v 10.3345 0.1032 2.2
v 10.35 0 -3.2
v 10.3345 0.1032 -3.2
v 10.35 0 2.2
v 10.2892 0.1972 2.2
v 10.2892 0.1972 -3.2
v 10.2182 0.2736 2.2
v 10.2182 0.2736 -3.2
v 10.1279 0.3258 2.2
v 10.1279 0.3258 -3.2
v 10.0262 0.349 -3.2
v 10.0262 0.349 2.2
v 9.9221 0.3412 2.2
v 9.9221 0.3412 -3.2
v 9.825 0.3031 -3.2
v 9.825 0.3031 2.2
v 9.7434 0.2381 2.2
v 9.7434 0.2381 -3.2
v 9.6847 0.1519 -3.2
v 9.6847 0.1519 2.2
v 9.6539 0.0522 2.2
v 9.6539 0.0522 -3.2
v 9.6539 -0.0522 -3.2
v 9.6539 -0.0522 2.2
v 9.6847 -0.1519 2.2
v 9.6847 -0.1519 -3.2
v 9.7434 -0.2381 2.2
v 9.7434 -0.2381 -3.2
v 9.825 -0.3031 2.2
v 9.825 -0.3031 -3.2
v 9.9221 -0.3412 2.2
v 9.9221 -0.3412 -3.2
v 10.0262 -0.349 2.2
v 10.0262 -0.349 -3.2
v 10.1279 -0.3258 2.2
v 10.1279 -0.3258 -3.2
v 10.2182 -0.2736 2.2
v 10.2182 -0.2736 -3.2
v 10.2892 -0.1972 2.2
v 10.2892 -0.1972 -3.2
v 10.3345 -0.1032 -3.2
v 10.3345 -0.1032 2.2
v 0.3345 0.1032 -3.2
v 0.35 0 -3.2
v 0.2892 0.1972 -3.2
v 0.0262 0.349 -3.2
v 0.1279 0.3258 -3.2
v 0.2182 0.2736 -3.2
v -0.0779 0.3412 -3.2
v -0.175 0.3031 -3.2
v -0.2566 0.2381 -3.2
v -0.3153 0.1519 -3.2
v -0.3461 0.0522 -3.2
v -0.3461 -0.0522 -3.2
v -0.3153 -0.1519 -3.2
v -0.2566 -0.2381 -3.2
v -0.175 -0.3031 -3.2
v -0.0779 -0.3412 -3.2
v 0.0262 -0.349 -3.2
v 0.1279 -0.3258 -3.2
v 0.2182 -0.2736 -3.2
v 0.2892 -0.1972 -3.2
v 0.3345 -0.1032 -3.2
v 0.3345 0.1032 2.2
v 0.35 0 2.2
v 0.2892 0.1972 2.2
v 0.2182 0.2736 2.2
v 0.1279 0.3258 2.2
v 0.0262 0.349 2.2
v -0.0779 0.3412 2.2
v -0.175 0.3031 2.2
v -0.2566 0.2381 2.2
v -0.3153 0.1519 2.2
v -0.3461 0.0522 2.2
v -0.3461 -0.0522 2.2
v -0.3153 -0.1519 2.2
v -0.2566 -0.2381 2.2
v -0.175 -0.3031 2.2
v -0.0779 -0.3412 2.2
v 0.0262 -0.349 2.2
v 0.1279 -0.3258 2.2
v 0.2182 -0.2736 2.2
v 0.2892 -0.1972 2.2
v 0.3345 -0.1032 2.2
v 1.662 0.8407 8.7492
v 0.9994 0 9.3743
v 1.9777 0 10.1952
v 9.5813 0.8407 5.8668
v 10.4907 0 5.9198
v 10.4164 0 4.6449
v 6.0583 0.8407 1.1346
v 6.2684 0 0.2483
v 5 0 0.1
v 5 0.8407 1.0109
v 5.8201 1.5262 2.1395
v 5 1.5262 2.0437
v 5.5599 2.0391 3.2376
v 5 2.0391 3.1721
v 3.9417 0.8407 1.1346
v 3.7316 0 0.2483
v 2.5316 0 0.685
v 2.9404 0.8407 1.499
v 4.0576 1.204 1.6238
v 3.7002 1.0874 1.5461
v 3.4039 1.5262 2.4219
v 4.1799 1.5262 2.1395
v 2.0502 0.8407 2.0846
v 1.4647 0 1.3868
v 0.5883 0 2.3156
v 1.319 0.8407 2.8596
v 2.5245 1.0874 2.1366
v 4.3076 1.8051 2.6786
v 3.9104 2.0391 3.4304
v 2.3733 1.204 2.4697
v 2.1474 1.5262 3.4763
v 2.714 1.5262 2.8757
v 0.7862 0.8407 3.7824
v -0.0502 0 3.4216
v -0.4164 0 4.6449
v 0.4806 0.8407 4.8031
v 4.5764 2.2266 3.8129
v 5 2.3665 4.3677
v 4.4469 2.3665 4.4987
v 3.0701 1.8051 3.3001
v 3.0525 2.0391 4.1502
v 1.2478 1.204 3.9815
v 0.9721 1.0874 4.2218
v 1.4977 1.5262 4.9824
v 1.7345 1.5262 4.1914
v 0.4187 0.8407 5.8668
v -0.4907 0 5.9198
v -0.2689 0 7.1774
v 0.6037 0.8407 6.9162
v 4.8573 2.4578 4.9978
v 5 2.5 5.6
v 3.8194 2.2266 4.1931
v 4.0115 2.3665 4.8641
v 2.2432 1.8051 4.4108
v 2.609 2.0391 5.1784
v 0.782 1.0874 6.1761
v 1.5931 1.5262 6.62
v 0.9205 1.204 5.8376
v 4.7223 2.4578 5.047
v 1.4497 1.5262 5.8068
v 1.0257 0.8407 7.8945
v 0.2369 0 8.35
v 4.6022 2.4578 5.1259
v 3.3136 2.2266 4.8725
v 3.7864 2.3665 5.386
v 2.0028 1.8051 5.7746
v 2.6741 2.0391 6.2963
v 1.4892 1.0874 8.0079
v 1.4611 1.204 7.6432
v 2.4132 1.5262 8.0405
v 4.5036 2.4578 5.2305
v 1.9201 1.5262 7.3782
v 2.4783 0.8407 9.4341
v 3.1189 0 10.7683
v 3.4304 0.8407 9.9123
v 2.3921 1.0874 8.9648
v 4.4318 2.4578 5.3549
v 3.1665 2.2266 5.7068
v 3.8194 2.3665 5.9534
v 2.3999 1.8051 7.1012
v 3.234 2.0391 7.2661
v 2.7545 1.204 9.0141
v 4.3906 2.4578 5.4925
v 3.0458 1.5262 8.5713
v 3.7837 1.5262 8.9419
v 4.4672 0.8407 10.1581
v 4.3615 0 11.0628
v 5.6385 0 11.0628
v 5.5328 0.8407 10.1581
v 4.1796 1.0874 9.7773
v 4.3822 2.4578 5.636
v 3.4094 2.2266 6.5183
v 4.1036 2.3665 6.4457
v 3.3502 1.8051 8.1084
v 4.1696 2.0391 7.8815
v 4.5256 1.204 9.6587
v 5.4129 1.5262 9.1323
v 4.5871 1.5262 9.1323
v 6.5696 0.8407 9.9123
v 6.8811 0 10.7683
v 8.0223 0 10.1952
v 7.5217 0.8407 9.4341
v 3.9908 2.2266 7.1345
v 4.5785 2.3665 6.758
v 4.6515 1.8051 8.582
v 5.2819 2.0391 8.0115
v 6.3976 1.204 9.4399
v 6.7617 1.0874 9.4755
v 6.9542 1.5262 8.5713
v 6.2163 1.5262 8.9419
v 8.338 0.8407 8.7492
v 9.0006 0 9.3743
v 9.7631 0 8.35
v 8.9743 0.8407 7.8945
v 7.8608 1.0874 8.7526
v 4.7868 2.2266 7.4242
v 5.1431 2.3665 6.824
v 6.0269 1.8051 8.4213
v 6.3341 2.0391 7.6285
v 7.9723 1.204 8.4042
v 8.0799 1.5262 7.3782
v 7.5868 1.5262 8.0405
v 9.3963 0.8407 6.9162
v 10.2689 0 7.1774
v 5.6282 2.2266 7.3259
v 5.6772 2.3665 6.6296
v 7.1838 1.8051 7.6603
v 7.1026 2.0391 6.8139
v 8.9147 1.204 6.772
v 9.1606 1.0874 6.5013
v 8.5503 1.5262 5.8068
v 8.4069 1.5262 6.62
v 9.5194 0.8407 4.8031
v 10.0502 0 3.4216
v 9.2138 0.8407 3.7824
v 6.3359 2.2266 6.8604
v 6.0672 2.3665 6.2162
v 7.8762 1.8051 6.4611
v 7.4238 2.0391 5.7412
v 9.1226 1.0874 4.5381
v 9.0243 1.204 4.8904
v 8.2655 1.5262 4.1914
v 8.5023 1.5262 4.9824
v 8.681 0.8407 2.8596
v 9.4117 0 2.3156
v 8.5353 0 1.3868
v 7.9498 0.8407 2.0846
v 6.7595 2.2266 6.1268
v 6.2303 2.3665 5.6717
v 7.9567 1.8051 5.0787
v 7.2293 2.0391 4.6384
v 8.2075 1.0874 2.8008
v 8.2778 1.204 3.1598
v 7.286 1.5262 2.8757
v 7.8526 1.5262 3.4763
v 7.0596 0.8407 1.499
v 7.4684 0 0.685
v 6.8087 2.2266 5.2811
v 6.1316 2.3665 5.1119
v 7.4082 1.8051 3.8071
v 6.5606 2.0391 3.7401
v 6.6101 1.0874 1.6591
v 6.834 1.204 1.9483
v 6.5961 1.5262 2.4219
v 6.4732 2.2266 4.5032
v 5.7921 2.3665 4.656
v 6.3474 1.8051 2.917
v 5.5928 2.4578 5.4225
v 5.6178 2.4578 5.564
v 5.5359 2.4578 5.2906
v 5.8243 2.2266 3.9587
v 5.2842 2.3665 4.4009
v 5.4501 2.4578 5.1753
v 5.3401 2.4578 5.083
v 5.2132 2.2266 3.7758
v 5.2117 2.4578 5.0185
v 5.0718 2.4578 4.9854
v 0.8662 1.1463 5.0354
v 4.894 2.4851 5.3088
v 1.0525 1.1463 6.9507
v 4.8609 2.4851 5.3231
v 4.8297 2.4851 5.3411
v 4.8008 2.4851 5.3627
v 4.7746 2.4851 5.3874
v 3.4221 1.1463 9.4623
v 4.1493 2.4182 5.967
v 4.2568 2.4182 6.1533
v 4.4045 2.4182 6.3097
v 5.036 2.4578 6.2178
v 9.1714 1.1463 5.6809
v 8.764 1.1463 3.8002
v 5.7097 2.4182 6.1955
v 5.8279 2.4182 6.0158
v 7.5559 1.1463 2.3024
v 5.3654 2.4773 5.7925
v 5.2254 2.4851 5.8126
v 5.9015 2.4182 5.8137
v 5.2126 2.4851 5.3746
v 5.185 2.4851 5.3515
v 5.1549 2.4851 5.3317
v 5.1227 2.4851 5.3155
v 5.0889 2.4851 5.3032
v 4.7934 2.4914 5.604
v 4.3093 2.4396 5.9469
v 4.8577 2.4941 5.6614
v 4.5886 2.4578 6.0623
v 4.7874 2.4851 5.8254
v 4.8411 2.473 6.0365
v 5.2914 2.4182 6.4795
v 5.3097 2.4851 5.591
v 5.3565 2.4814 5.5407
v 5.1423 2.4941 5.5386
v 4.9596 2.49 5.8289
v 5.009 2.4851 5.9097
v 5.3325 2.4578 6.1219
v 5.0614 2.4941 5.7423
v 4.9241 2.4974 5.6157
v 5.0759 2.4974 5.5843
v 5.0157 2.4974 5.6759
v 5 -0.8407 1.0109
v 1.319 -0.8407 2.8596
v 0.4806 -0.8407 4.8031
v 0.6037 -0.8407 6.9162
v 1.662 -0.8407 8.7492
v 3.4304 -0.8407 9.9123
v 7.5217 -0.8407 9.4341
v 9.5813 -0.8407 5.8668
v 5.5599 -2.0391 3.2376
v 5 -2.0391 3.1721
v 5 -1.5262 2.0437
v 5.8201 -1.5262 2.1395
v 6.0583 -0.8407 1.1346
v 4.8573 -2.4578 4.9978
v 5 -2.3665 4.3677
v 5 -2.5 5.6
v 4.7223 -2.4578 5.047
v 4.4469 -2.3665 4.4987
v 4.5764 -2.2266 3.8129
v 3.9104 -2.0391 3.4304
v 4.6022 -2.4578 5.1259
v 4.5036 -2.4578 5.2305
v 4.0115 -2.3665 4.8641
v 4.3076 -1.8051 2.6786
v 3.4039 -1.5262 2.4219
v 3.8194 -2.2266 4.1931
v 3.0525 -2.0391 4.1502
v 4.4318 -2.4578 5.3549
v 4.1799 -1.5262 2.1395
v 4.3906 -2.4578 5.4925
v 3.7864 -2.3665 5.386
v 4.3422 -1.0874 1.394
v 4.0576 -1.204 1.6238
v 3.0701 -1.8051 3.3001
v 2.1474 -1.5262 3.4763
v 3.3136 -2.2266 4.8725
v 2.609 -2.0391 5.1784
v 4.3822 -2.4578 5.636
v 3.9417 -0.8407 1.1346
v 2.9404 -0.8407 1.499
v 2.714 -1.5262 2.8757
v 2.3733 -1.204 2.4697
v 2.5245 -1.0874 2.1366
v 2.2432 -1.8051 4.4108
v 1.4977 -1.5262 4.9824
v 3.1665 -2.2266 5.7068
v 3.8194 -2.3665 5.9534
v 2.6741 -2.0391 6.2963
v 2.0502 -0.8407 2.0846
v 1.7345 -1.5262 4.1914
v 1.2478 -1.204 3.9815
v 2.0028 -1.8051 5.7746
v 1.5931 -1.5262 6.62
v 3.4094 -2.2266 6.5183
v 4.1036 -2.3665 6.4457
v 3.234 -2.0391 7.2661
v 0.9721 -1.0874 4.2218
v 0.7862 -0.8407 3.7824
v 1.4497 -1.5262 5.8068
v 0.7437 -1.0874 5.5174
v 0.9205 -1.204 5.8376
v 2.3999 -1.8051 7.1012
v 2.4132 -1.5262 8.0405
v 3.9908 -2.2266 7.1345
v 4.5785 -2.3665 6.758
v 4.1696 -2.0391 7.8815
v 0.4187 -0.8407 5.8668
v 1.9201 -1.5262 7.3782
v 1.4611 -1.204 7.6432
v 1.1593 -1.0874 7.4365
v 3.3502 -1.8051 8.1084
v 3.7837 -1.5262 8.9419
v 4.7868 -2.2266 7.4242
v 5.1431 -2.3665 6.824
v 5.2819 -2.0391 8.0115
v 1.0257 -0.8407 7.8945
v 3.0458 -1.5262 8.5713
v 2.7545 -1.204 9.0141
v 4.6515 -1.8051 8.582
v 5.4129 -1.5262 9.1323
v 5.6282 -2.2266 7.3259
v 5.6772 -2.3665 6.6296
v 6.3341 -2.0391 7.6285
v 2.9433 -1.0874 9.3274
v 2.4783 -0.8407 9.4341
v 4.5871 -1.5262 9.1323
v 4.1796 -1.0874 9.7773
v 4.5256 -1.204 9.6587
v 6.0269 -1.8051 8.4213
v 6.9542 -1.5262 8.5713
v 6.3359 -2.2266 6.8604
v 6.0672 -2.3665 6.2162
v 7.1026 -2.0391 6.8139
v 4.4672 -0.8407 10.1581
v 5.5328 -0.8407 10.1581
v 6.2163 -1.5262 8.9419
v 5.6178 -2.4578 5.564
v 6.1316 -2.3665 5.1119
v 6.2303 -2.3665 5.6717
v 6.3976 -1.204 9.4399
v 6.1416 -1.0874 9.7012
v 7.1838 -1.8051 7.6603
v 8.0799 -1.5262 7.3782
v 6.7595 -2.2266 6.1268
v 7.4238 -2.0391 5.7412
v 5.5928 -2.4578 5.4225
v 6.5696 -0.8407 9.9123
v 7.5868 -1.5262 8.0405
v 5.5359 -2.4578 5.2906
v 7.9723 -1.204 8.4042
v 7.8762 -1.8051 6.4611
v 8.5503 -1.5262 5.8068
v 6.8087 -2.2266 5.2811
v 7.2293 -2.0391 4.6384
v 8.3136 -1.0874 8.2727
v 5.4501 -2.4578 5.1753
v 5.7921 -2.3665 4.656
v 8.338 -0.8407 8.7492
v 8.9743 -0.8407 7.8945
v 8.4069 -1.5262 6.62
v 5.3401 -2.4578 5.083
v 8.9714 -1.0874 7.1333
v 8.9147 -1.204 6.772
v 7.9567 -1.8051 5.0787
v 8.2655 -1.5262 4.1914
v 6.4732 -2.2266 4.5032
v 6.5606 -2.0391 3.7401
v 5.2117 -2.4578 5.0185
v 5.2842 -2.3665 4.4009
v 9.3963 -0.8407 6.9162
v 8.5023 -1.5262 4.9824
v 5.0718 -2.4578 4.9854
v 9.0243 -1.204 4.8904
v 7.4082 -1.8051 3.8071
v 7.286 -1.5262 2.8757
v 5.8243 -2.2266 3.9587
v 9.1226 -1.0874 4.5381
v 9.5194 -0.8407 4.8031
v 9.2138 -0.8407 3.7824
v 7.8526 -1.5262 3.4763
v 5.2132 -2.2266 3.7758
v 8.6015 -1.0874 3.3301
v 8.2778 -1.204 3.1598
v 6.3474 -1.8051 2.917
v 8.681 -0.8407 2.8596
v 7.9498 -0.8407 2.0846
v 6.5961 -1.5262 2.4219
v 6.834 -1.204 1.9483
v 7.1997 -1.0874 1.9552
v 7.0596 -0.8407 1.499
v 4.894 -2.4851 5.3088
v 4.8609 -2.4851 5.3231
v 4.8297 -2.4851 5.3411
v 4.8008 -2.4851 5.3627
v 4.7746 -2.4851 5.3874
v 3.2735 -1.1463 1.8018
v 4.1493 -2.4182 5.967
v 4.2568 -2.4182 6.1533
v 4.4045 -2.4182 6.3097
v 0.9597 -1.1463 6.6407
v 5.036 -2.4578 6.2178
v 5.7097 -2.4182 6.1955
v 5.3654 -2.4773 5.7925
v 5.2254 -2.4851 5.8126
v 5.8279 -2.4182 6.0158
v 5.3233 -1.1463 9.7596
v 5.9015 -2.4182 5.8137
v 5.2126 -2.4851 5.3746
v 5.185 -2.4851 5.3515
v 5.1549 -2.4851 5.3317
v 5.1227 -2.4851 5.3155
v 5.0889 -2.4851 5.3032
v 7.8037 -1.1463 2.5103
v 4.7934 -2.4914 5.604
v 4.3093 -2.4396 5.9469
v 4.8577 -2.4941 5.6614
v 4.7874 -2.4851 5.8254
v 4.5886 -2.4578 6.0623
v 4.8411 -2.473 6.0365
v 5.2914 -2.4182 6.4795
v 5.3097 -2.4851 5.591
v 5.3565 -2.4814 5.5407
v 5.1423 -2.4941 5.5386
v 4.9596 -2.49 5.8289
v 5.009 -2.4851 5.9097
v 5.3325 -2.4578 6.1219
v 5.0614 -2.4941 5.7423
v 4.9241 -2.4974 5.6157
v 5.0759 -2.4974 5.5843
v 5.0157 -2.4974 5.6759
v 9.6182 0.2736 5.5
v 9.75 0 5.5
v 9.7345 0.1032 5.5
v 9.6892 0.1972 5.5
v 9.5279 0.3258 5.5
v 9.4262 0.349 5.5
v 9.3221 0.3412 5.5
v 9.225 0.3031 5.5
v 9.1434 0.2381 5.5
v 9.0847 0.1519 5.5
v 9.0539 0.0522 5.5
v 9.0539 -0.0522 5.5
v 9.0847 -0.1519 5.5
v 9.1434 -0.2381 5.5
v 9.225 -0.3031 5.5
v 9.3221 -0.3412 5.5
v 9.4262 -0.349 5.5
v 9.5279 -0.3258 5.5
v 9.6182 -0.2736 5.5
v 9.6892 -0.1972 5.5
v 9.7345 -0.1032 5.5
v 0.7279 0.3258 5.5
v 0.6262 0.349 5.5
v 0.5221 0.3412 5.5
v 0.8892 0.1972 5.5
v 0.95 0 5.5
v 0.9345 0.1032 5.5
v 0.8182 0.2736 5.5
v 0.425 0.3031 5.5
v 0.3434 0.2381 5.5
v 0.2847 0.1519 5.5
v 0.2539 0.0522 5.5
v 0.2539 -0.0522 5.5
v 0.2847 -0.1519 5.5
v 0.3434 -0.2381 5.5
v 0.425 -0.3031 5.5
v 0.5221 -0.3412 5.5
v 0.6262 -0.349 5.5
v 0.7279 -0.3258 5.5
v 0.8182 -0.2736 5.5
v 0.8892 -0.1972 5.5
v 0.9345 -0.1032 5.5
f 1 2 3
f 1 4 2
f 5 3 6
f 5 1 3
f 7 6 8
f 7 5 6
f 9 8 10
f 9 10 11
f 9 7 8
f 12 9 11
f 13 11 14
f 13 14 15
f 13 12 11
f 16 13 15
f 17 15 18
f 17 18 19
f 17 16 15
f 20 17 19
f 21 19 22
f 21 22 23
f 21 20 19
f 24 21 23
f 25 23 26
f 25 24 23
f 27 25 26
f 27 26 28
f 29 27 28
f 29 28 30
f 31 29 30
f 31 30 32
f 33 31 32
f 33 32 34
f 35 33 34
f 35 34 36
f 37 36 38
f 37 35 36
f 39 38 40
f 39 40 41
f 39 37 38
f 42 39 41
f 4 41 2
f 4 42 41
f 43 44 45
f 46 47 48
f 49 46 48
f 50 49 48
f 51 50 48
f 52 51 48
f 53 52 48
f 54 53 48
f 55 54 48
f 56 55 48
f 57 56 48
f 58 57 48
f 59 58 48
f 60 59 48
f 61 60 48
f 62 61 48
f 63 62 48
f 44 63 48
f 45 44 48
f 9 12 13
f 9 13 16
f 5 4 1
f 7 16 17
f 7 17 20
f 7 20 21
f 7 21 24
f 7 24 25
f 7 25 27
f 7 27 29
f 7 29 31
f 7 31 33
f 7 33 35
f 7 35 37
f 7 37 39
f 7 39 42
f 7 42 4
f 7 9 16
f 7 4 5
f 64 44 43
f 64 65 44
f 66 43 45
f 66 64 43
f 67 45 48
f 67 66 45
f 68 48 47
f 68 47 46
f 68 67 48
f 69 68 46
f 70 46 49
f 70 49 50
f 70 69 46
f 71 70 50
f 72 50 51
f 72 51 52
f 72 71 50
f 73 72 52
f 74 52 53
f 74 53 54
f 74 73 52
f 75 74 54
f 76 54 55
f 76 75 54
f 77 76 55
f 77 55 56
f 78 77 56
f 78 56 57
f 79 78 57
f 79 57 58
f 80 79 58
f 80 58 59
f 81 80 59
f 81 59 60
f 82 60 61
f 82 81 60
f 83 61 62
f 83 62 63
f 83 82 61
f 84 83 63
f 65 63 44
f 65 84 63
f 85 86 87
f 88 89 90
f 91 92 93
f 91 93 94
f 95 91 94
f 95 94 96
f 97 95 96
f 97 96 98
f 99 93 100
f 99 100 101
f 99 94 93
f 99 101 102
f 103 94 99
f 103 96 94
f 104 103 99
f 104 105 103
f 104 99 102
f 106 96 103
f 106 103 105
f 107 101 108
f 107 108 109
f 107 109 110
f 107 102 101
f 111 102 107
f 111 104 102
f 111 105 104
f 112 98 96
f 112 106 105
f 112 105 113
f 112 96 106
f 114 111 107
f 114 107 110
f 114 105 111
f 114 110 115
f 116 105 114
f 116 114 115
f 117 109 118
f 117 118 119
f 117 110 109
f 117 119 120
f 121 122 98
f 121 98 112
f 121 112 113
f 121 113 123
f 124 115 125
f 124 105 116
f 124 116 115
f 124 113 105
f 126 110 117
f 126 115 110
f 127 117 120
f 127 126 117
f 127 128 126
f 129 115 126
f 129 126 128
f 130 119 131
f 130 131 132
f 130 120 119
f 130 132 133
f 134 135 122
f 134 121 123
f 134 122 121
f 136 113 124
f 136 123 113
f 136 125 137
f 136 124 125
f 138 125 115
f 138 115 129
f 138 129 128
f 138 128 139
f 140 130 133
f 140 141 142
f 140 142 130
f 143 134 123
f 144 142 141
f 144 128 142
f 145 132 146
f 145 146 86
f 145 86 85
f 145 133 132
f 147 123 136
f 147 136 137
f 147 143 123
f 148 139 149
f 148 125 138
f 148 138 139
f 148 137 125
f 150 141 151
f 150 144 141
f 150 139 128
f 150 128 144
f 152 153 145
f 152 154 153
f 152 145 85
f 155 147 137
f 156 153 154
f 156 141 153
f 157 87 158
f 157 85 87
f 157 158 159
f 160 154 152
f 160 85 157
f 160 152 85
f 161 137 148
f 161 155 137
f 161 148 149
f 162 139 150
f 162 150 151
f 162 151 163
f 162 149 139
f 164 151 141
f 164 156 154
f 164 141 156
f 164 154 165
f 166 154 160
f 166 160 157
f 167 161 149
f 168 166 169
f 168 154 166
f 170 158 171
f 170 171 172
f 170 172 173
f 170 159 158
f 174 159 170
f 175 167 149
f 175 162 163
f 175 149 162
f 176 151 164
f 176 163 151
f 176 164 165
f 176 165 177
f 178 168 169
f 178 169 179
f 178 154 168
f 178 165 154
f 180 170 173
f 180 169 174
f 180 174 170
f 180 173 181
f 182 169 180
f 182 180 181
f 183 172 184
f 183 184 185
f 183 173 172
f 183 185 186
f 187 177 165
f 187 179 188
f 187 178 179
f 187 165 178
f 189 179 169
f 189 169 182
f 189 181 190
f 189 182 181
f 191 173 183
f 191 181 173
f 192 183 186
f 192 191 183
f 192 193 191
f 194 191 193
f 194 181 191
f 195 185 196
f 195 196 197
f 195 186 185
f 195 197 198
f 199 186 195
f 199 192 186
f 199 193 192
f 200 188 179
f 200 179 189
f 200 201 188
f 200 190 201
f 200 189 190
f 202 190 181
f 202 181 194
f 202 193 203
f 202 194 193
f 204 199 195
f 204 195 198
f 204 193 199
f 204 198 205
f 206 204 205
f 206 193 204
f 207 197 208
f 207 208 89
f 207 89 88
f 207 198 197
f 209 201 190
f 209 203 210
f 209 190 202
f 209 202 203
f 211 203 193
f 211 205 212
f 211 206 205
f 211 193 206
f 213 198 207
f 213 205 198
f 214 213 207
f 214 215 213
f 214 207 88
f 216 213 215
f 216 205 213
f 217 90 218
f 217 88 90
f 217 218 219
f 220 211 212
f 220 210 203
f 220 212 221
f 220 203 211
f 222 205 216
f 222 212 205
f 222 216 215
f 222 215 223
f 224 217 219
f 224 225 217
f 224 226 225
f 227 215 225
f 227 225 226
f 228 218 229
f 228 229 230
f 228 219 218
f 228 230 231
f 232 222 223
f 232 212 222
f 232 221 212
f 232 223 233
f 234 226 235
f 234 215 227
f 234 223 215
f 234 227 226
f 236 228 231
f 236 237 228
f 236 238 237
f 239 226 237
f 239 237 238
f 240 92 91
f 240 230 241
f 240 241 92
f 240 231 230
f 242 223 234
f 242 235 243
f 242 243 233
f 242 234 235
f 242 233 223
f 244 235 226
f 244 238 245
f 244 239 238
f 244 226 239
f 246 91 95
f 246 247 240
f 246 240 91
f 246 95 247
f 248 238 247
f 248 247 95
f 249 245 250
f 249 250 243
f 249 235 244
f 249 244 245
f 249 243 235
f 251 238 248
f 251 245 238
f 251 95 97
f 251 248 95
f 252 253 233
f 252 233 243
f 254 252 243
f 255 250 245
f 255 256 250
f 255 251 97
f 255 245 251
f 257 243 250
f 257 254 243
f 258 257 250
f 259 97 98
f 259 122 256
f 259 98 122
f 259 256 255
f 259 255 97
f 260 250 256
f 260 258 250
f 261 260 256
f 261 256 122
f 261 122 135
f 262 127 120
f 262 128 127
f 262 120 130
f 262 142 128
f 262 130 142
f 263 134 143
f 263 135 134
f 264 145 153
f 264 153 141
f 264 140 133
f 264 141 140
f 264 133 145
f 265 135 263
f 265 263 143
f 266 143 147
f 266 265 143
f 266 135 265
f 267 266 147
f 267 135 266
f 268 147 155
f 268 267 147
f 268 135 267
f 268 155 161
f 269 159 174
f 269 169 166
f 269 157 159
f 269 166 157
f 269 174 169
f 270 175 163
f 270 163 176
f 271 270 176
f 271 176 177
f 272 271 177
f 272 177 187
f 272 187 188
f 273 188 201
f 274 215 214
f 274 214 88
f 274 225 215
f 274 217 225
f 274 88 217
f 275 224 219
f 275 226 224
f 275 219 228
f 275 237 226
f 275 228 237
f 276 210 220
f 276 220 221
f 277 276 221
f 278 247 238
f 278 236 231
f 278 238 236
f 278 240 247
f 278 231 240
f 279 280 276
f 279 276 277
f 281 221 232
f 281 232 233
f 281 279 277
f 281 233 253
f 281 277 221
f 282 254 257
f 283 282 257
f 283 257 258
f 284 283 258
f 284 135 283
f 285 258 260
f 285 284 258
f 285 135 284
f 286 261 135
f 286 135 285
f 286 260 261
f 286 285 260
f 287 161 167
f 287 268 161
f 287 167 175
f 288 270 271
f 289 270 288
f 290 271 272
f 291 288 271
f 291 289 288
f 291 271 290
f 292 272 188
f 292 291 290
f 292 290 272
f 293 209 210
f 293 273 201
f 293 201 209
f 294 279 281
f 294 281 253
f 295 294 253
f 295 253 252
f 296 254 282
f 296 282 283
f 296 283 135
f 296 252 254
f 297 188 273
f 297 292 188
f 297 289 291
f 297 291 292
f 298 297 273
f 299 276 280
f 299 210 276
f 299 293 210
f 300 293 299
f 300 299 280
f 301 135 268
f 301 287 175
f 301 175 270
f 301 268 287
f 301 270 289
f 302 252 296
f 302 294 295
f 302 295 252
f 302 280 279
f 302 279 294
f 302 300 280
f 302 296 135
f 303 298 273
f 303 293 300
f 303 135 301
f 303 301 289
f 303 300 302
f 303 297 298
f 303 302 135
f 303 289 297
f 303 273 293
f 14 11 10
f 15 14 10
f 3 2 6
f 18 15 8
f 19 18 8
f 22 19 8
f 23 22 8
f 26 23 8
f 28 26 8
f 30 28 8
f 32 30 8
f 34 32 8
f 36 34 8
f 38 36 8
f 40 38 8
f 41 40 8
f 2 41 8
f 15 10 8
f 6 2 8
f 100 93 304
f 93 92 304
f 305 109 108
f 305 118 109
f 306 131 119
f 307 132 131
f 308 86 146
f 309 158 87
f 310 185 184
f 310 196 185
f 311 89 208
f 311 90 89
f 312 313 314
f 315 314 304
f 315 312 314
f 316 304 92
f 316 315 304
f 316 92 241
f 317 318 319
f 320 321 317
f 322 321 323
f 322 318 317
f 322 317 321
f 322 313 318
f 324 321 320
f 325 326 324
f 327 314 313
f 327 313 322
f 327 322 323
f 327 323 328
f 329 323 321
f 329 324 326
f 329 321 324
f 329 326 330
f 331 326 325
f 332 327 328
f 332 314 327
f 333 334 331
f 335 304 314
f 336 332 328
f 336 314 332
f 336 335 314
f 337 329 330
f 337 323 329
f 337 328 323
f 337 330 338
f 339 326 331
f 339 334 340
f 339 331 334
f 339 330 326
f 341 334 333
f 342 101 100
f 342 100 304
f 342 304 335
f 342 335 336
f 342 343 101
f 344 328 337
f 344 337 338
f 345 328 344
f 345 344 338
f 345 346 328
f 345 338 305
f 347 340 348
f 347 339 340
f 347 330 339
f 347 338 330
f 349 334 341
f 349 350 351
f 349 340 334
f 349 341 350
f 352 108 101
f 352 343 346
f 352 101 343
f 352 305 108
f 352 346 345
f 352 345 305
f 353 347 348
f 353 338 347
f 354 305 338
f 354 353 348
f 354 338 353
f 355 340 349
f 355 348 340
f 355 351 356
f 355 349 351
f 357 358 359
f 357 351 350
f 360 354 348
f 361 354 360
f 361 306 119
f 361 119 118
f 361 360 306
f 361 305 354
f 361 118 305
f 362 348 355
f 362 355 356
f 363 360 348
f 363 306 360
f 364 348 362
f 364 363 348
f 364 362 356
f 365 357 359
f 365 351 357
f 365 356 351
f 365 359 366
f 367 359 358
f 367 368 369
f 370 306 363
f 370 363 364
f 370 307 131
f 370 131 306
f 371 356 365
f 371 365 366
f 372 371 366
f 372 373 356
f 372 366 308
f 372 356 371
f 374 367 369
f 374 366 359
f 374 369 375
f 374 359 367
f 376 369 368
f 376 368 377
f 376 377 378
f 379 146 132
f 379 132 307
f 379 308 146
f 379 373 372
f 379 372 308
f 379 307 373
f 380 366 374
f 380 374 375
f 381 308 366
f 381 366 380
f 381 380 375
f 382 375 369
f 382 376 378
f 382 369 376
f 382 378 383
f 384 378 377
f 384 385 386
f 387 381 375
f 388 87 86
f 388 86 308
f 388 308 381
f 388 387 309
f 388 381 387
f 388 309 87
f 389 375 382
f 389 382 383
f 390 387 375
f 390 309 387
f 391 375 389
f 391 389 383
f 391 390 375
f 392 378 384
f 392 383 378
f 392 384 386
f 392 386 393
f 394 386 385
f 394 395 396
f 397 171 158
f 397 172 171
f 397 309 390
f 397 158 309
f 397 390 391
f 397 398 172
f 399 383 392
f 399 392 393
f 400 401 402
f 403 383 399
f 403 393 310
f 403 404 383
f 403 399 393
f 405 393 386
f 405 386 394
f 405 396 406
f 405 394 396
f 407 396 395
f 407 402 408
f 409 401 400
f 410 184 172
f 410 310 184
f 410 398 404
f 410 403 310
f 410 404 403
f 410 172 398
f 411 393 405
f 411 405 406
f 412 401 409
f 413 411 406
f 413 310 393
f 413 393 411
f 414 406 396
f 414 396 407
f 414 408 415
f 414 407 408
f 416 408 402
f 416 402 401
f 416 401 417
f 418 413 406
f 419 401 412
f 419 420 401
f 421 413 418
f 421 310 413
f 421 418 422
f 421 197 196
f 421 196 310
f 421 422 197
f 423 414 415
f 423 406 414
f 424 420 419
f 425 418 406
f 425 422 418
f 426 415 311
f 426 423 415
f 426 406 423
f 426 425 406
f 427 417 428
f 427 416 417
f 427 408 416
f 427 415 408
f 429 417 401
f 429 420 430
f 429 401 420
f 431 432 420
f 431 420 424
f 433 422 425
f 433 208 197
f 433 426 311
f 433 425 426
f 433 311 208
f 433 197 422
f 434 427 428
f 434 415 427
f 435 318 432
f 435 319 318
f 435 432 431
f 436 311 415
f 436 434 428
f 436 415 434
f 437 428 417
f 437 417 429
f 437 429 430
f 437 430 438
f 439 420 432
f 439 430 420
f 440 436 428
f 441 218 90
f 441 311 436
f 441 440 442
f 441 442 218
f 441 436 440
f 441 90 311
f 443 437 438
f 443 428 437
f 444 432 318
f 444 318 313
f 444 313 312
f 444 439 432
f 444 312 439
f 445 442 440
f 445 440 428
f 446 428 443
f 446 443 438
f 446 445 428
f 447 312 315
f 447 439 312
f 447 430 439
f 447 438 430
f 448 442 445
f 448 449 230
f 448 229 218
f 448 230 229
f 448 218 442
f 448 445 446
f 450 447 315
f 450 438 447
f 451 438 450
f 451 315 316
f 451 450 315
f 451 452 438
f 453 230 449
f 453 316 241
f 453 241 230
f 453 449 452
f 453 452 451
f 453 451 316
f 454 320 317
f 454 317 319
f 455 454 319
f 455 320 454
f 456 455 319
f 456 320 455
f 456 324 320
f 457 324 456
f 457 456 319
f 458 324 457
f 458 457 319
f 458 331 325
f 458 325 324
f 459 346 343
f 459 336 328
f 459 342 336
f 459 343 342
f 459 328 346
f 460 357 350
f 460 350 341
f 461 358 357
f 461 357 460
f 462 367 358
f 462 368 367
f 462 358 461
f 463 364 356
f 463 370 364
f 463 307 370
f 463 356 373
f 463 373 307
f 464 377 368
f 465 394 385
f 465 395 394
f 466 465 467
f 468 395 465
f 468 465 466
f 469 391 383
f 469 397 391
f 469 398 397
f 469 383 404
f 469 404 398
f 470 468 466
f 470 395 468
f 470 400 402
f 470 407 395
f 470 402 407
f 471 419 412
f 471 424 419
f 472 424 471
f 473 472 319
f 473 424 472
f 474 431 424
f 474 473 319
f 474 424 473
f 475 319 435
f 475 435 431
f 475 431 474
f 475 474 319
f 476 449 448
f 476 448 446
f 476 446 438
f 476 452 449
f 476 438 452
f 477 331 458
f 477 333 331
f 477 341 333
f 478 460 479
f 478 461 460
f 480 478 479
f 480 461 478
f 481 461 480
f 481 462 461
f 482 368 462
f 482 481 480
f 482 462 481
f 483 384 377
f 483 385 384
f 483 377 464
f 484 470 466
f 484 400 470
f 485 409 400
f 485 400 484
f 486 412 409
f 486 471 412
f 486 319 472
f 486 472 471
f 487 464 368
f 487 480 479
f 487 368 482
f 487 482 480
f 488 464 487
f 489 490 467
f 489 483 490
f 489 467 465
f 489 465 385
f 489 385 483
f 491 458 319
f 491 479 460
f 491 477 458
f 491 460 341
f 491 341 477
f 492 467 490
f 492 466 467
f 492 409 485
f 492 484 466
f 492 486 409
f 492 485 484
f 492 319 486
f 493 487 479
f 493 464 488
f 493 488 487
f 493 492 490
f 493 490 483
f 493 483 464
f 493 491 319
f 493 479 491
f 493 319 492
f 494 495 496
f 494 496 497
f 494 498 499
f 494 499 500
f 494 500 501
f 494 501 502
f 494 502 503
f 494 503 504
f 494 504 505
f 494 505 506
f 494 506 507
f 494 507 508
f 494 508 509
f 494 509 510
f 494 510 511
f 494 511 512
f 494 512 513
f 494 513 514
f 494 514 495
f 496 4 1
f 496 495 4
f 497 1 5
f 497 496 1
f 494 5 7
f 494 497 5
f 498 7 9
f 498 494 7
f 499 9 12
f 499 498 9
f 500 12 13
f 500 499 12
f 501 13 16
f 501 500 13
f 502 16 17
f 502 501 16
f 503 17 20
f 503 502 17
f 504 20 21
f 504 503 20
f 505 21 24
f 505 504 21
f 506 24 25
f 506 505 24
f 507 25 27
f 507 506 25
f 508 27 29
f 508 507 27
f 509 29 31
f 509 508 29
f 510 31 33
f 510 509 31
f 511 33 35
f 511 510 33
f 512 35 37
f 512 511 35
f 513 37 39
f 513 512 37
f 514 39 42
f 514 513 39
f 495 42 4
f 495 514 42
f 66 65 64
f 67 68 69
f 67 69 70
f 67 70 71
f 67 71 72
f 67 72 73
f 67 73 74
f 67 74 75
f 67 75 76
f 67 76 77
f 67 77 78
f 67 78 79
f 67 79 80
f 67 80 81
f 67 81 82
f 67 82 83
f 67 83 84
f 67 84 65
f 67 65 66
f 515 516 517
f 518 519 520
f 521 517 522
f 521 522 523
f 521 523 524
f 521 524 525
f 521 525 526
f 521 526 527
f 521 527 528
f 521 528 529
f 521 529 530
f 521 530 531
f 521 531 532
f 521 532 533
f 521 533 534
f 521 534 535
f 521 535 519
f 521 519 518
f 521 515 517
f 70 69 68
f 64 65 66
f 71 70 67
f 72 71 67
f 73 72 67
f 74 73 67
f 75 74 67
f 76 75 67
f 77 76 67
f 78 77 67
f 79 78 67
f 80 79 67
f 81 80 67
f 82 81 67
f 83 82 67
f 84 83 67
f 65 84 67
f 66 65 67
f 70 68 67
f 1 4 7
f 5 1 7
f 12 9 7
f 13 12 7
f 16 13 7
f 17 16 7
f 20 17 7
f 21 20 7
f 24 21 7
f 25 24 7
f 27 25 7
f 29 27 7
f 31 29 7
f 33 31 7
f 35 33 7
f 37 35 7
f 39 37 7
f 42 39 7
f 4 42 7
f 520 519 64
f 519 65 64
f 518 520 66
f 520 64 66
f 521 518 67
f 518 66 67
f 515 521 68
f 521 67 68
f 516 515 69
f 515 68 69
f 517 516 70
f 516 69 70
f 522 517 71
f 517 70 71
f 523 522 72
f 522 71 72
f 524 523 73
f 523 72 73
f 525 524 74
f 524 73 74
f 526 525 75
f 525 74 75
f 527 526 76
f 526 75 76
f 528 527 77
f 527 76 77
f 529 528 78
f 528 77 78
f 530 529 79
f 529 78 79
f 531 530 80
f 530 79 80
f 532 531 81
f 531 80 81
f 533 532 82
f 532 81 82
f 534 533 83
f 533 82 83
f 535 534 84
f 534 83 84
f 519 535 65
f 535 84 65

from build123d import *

# Parameters (mm, degrees)
SKETCH001_R       = 0.35
PAD001_DEPTH      = 2.2
PAD001_DEPTH_BACK = 3.2
SKETCH002_R       = 0.35
SKETCH003_R       = 0.35
SKETCH004_R       = 0.35
SKETCH005_R       = 0.35


with BuildPart() as pad001:
    # Sketch001 → Pad001 (new body, two sides)
    with BuildSketch(Plane.XY) as pad001_sk:
        Circle(SKETCH001_R)
        with Locations((10, 0)):
            Circle(SKETCH001_R)
    extrude(amount=PAD001_DEPTH)
    extrude(pad001_sk.sketch, amount=-PAD001_DEPTH_BACK)


with BuildPart() as revolution:
    # Sketch → Revolution (revolve)
    with BuildSketch(Plane.YZ.offset(5)):
        with BuildLine():
            Line((-2.5, 5.6), (2.5, 5.6))
            ThreePointArc((0, 0.1), (1.805122, 2.597672), (2.5, 5.6))
            ThreePointArc((-2.5, 5.6), (-1.805122, 2.597672), (0, 0.1))
        make_face()
    revolve(axis=Axis((5, -3.32079, 5.6), (0, 1, 0)))


with BuildPart() as loft_body:
    # Sketch002 → Loft section 0
    with BuildSketch(Plane.XY.offset(5.5)):
        with Locations((0.6, 0)):
            Circle(SKETCH002_R)
    # Sketch003 → Loft section 1
    with BuildSketch(Plane.XY.offset(2.2)):
        Circle(SKETCH003_R)
    loft()


with BuildPart() as loft001:
    # Sketch004 → Loft001 section 0
    with BuildSketch(Plane.XY.offset(2.2)):
        with Locations((10, 0)):
            Circle(SKETCH004_R)
    # Sketch005 → Loft001 section 1
    with BuildSketch(Plane.XY.offset(5.5)):
        with Locations((9.4, 0)):
            Circle(SKETCH005_R)
    loft()


solid = Compound([pad001.part, revolution.part, loft_body.part, loft001.part])
